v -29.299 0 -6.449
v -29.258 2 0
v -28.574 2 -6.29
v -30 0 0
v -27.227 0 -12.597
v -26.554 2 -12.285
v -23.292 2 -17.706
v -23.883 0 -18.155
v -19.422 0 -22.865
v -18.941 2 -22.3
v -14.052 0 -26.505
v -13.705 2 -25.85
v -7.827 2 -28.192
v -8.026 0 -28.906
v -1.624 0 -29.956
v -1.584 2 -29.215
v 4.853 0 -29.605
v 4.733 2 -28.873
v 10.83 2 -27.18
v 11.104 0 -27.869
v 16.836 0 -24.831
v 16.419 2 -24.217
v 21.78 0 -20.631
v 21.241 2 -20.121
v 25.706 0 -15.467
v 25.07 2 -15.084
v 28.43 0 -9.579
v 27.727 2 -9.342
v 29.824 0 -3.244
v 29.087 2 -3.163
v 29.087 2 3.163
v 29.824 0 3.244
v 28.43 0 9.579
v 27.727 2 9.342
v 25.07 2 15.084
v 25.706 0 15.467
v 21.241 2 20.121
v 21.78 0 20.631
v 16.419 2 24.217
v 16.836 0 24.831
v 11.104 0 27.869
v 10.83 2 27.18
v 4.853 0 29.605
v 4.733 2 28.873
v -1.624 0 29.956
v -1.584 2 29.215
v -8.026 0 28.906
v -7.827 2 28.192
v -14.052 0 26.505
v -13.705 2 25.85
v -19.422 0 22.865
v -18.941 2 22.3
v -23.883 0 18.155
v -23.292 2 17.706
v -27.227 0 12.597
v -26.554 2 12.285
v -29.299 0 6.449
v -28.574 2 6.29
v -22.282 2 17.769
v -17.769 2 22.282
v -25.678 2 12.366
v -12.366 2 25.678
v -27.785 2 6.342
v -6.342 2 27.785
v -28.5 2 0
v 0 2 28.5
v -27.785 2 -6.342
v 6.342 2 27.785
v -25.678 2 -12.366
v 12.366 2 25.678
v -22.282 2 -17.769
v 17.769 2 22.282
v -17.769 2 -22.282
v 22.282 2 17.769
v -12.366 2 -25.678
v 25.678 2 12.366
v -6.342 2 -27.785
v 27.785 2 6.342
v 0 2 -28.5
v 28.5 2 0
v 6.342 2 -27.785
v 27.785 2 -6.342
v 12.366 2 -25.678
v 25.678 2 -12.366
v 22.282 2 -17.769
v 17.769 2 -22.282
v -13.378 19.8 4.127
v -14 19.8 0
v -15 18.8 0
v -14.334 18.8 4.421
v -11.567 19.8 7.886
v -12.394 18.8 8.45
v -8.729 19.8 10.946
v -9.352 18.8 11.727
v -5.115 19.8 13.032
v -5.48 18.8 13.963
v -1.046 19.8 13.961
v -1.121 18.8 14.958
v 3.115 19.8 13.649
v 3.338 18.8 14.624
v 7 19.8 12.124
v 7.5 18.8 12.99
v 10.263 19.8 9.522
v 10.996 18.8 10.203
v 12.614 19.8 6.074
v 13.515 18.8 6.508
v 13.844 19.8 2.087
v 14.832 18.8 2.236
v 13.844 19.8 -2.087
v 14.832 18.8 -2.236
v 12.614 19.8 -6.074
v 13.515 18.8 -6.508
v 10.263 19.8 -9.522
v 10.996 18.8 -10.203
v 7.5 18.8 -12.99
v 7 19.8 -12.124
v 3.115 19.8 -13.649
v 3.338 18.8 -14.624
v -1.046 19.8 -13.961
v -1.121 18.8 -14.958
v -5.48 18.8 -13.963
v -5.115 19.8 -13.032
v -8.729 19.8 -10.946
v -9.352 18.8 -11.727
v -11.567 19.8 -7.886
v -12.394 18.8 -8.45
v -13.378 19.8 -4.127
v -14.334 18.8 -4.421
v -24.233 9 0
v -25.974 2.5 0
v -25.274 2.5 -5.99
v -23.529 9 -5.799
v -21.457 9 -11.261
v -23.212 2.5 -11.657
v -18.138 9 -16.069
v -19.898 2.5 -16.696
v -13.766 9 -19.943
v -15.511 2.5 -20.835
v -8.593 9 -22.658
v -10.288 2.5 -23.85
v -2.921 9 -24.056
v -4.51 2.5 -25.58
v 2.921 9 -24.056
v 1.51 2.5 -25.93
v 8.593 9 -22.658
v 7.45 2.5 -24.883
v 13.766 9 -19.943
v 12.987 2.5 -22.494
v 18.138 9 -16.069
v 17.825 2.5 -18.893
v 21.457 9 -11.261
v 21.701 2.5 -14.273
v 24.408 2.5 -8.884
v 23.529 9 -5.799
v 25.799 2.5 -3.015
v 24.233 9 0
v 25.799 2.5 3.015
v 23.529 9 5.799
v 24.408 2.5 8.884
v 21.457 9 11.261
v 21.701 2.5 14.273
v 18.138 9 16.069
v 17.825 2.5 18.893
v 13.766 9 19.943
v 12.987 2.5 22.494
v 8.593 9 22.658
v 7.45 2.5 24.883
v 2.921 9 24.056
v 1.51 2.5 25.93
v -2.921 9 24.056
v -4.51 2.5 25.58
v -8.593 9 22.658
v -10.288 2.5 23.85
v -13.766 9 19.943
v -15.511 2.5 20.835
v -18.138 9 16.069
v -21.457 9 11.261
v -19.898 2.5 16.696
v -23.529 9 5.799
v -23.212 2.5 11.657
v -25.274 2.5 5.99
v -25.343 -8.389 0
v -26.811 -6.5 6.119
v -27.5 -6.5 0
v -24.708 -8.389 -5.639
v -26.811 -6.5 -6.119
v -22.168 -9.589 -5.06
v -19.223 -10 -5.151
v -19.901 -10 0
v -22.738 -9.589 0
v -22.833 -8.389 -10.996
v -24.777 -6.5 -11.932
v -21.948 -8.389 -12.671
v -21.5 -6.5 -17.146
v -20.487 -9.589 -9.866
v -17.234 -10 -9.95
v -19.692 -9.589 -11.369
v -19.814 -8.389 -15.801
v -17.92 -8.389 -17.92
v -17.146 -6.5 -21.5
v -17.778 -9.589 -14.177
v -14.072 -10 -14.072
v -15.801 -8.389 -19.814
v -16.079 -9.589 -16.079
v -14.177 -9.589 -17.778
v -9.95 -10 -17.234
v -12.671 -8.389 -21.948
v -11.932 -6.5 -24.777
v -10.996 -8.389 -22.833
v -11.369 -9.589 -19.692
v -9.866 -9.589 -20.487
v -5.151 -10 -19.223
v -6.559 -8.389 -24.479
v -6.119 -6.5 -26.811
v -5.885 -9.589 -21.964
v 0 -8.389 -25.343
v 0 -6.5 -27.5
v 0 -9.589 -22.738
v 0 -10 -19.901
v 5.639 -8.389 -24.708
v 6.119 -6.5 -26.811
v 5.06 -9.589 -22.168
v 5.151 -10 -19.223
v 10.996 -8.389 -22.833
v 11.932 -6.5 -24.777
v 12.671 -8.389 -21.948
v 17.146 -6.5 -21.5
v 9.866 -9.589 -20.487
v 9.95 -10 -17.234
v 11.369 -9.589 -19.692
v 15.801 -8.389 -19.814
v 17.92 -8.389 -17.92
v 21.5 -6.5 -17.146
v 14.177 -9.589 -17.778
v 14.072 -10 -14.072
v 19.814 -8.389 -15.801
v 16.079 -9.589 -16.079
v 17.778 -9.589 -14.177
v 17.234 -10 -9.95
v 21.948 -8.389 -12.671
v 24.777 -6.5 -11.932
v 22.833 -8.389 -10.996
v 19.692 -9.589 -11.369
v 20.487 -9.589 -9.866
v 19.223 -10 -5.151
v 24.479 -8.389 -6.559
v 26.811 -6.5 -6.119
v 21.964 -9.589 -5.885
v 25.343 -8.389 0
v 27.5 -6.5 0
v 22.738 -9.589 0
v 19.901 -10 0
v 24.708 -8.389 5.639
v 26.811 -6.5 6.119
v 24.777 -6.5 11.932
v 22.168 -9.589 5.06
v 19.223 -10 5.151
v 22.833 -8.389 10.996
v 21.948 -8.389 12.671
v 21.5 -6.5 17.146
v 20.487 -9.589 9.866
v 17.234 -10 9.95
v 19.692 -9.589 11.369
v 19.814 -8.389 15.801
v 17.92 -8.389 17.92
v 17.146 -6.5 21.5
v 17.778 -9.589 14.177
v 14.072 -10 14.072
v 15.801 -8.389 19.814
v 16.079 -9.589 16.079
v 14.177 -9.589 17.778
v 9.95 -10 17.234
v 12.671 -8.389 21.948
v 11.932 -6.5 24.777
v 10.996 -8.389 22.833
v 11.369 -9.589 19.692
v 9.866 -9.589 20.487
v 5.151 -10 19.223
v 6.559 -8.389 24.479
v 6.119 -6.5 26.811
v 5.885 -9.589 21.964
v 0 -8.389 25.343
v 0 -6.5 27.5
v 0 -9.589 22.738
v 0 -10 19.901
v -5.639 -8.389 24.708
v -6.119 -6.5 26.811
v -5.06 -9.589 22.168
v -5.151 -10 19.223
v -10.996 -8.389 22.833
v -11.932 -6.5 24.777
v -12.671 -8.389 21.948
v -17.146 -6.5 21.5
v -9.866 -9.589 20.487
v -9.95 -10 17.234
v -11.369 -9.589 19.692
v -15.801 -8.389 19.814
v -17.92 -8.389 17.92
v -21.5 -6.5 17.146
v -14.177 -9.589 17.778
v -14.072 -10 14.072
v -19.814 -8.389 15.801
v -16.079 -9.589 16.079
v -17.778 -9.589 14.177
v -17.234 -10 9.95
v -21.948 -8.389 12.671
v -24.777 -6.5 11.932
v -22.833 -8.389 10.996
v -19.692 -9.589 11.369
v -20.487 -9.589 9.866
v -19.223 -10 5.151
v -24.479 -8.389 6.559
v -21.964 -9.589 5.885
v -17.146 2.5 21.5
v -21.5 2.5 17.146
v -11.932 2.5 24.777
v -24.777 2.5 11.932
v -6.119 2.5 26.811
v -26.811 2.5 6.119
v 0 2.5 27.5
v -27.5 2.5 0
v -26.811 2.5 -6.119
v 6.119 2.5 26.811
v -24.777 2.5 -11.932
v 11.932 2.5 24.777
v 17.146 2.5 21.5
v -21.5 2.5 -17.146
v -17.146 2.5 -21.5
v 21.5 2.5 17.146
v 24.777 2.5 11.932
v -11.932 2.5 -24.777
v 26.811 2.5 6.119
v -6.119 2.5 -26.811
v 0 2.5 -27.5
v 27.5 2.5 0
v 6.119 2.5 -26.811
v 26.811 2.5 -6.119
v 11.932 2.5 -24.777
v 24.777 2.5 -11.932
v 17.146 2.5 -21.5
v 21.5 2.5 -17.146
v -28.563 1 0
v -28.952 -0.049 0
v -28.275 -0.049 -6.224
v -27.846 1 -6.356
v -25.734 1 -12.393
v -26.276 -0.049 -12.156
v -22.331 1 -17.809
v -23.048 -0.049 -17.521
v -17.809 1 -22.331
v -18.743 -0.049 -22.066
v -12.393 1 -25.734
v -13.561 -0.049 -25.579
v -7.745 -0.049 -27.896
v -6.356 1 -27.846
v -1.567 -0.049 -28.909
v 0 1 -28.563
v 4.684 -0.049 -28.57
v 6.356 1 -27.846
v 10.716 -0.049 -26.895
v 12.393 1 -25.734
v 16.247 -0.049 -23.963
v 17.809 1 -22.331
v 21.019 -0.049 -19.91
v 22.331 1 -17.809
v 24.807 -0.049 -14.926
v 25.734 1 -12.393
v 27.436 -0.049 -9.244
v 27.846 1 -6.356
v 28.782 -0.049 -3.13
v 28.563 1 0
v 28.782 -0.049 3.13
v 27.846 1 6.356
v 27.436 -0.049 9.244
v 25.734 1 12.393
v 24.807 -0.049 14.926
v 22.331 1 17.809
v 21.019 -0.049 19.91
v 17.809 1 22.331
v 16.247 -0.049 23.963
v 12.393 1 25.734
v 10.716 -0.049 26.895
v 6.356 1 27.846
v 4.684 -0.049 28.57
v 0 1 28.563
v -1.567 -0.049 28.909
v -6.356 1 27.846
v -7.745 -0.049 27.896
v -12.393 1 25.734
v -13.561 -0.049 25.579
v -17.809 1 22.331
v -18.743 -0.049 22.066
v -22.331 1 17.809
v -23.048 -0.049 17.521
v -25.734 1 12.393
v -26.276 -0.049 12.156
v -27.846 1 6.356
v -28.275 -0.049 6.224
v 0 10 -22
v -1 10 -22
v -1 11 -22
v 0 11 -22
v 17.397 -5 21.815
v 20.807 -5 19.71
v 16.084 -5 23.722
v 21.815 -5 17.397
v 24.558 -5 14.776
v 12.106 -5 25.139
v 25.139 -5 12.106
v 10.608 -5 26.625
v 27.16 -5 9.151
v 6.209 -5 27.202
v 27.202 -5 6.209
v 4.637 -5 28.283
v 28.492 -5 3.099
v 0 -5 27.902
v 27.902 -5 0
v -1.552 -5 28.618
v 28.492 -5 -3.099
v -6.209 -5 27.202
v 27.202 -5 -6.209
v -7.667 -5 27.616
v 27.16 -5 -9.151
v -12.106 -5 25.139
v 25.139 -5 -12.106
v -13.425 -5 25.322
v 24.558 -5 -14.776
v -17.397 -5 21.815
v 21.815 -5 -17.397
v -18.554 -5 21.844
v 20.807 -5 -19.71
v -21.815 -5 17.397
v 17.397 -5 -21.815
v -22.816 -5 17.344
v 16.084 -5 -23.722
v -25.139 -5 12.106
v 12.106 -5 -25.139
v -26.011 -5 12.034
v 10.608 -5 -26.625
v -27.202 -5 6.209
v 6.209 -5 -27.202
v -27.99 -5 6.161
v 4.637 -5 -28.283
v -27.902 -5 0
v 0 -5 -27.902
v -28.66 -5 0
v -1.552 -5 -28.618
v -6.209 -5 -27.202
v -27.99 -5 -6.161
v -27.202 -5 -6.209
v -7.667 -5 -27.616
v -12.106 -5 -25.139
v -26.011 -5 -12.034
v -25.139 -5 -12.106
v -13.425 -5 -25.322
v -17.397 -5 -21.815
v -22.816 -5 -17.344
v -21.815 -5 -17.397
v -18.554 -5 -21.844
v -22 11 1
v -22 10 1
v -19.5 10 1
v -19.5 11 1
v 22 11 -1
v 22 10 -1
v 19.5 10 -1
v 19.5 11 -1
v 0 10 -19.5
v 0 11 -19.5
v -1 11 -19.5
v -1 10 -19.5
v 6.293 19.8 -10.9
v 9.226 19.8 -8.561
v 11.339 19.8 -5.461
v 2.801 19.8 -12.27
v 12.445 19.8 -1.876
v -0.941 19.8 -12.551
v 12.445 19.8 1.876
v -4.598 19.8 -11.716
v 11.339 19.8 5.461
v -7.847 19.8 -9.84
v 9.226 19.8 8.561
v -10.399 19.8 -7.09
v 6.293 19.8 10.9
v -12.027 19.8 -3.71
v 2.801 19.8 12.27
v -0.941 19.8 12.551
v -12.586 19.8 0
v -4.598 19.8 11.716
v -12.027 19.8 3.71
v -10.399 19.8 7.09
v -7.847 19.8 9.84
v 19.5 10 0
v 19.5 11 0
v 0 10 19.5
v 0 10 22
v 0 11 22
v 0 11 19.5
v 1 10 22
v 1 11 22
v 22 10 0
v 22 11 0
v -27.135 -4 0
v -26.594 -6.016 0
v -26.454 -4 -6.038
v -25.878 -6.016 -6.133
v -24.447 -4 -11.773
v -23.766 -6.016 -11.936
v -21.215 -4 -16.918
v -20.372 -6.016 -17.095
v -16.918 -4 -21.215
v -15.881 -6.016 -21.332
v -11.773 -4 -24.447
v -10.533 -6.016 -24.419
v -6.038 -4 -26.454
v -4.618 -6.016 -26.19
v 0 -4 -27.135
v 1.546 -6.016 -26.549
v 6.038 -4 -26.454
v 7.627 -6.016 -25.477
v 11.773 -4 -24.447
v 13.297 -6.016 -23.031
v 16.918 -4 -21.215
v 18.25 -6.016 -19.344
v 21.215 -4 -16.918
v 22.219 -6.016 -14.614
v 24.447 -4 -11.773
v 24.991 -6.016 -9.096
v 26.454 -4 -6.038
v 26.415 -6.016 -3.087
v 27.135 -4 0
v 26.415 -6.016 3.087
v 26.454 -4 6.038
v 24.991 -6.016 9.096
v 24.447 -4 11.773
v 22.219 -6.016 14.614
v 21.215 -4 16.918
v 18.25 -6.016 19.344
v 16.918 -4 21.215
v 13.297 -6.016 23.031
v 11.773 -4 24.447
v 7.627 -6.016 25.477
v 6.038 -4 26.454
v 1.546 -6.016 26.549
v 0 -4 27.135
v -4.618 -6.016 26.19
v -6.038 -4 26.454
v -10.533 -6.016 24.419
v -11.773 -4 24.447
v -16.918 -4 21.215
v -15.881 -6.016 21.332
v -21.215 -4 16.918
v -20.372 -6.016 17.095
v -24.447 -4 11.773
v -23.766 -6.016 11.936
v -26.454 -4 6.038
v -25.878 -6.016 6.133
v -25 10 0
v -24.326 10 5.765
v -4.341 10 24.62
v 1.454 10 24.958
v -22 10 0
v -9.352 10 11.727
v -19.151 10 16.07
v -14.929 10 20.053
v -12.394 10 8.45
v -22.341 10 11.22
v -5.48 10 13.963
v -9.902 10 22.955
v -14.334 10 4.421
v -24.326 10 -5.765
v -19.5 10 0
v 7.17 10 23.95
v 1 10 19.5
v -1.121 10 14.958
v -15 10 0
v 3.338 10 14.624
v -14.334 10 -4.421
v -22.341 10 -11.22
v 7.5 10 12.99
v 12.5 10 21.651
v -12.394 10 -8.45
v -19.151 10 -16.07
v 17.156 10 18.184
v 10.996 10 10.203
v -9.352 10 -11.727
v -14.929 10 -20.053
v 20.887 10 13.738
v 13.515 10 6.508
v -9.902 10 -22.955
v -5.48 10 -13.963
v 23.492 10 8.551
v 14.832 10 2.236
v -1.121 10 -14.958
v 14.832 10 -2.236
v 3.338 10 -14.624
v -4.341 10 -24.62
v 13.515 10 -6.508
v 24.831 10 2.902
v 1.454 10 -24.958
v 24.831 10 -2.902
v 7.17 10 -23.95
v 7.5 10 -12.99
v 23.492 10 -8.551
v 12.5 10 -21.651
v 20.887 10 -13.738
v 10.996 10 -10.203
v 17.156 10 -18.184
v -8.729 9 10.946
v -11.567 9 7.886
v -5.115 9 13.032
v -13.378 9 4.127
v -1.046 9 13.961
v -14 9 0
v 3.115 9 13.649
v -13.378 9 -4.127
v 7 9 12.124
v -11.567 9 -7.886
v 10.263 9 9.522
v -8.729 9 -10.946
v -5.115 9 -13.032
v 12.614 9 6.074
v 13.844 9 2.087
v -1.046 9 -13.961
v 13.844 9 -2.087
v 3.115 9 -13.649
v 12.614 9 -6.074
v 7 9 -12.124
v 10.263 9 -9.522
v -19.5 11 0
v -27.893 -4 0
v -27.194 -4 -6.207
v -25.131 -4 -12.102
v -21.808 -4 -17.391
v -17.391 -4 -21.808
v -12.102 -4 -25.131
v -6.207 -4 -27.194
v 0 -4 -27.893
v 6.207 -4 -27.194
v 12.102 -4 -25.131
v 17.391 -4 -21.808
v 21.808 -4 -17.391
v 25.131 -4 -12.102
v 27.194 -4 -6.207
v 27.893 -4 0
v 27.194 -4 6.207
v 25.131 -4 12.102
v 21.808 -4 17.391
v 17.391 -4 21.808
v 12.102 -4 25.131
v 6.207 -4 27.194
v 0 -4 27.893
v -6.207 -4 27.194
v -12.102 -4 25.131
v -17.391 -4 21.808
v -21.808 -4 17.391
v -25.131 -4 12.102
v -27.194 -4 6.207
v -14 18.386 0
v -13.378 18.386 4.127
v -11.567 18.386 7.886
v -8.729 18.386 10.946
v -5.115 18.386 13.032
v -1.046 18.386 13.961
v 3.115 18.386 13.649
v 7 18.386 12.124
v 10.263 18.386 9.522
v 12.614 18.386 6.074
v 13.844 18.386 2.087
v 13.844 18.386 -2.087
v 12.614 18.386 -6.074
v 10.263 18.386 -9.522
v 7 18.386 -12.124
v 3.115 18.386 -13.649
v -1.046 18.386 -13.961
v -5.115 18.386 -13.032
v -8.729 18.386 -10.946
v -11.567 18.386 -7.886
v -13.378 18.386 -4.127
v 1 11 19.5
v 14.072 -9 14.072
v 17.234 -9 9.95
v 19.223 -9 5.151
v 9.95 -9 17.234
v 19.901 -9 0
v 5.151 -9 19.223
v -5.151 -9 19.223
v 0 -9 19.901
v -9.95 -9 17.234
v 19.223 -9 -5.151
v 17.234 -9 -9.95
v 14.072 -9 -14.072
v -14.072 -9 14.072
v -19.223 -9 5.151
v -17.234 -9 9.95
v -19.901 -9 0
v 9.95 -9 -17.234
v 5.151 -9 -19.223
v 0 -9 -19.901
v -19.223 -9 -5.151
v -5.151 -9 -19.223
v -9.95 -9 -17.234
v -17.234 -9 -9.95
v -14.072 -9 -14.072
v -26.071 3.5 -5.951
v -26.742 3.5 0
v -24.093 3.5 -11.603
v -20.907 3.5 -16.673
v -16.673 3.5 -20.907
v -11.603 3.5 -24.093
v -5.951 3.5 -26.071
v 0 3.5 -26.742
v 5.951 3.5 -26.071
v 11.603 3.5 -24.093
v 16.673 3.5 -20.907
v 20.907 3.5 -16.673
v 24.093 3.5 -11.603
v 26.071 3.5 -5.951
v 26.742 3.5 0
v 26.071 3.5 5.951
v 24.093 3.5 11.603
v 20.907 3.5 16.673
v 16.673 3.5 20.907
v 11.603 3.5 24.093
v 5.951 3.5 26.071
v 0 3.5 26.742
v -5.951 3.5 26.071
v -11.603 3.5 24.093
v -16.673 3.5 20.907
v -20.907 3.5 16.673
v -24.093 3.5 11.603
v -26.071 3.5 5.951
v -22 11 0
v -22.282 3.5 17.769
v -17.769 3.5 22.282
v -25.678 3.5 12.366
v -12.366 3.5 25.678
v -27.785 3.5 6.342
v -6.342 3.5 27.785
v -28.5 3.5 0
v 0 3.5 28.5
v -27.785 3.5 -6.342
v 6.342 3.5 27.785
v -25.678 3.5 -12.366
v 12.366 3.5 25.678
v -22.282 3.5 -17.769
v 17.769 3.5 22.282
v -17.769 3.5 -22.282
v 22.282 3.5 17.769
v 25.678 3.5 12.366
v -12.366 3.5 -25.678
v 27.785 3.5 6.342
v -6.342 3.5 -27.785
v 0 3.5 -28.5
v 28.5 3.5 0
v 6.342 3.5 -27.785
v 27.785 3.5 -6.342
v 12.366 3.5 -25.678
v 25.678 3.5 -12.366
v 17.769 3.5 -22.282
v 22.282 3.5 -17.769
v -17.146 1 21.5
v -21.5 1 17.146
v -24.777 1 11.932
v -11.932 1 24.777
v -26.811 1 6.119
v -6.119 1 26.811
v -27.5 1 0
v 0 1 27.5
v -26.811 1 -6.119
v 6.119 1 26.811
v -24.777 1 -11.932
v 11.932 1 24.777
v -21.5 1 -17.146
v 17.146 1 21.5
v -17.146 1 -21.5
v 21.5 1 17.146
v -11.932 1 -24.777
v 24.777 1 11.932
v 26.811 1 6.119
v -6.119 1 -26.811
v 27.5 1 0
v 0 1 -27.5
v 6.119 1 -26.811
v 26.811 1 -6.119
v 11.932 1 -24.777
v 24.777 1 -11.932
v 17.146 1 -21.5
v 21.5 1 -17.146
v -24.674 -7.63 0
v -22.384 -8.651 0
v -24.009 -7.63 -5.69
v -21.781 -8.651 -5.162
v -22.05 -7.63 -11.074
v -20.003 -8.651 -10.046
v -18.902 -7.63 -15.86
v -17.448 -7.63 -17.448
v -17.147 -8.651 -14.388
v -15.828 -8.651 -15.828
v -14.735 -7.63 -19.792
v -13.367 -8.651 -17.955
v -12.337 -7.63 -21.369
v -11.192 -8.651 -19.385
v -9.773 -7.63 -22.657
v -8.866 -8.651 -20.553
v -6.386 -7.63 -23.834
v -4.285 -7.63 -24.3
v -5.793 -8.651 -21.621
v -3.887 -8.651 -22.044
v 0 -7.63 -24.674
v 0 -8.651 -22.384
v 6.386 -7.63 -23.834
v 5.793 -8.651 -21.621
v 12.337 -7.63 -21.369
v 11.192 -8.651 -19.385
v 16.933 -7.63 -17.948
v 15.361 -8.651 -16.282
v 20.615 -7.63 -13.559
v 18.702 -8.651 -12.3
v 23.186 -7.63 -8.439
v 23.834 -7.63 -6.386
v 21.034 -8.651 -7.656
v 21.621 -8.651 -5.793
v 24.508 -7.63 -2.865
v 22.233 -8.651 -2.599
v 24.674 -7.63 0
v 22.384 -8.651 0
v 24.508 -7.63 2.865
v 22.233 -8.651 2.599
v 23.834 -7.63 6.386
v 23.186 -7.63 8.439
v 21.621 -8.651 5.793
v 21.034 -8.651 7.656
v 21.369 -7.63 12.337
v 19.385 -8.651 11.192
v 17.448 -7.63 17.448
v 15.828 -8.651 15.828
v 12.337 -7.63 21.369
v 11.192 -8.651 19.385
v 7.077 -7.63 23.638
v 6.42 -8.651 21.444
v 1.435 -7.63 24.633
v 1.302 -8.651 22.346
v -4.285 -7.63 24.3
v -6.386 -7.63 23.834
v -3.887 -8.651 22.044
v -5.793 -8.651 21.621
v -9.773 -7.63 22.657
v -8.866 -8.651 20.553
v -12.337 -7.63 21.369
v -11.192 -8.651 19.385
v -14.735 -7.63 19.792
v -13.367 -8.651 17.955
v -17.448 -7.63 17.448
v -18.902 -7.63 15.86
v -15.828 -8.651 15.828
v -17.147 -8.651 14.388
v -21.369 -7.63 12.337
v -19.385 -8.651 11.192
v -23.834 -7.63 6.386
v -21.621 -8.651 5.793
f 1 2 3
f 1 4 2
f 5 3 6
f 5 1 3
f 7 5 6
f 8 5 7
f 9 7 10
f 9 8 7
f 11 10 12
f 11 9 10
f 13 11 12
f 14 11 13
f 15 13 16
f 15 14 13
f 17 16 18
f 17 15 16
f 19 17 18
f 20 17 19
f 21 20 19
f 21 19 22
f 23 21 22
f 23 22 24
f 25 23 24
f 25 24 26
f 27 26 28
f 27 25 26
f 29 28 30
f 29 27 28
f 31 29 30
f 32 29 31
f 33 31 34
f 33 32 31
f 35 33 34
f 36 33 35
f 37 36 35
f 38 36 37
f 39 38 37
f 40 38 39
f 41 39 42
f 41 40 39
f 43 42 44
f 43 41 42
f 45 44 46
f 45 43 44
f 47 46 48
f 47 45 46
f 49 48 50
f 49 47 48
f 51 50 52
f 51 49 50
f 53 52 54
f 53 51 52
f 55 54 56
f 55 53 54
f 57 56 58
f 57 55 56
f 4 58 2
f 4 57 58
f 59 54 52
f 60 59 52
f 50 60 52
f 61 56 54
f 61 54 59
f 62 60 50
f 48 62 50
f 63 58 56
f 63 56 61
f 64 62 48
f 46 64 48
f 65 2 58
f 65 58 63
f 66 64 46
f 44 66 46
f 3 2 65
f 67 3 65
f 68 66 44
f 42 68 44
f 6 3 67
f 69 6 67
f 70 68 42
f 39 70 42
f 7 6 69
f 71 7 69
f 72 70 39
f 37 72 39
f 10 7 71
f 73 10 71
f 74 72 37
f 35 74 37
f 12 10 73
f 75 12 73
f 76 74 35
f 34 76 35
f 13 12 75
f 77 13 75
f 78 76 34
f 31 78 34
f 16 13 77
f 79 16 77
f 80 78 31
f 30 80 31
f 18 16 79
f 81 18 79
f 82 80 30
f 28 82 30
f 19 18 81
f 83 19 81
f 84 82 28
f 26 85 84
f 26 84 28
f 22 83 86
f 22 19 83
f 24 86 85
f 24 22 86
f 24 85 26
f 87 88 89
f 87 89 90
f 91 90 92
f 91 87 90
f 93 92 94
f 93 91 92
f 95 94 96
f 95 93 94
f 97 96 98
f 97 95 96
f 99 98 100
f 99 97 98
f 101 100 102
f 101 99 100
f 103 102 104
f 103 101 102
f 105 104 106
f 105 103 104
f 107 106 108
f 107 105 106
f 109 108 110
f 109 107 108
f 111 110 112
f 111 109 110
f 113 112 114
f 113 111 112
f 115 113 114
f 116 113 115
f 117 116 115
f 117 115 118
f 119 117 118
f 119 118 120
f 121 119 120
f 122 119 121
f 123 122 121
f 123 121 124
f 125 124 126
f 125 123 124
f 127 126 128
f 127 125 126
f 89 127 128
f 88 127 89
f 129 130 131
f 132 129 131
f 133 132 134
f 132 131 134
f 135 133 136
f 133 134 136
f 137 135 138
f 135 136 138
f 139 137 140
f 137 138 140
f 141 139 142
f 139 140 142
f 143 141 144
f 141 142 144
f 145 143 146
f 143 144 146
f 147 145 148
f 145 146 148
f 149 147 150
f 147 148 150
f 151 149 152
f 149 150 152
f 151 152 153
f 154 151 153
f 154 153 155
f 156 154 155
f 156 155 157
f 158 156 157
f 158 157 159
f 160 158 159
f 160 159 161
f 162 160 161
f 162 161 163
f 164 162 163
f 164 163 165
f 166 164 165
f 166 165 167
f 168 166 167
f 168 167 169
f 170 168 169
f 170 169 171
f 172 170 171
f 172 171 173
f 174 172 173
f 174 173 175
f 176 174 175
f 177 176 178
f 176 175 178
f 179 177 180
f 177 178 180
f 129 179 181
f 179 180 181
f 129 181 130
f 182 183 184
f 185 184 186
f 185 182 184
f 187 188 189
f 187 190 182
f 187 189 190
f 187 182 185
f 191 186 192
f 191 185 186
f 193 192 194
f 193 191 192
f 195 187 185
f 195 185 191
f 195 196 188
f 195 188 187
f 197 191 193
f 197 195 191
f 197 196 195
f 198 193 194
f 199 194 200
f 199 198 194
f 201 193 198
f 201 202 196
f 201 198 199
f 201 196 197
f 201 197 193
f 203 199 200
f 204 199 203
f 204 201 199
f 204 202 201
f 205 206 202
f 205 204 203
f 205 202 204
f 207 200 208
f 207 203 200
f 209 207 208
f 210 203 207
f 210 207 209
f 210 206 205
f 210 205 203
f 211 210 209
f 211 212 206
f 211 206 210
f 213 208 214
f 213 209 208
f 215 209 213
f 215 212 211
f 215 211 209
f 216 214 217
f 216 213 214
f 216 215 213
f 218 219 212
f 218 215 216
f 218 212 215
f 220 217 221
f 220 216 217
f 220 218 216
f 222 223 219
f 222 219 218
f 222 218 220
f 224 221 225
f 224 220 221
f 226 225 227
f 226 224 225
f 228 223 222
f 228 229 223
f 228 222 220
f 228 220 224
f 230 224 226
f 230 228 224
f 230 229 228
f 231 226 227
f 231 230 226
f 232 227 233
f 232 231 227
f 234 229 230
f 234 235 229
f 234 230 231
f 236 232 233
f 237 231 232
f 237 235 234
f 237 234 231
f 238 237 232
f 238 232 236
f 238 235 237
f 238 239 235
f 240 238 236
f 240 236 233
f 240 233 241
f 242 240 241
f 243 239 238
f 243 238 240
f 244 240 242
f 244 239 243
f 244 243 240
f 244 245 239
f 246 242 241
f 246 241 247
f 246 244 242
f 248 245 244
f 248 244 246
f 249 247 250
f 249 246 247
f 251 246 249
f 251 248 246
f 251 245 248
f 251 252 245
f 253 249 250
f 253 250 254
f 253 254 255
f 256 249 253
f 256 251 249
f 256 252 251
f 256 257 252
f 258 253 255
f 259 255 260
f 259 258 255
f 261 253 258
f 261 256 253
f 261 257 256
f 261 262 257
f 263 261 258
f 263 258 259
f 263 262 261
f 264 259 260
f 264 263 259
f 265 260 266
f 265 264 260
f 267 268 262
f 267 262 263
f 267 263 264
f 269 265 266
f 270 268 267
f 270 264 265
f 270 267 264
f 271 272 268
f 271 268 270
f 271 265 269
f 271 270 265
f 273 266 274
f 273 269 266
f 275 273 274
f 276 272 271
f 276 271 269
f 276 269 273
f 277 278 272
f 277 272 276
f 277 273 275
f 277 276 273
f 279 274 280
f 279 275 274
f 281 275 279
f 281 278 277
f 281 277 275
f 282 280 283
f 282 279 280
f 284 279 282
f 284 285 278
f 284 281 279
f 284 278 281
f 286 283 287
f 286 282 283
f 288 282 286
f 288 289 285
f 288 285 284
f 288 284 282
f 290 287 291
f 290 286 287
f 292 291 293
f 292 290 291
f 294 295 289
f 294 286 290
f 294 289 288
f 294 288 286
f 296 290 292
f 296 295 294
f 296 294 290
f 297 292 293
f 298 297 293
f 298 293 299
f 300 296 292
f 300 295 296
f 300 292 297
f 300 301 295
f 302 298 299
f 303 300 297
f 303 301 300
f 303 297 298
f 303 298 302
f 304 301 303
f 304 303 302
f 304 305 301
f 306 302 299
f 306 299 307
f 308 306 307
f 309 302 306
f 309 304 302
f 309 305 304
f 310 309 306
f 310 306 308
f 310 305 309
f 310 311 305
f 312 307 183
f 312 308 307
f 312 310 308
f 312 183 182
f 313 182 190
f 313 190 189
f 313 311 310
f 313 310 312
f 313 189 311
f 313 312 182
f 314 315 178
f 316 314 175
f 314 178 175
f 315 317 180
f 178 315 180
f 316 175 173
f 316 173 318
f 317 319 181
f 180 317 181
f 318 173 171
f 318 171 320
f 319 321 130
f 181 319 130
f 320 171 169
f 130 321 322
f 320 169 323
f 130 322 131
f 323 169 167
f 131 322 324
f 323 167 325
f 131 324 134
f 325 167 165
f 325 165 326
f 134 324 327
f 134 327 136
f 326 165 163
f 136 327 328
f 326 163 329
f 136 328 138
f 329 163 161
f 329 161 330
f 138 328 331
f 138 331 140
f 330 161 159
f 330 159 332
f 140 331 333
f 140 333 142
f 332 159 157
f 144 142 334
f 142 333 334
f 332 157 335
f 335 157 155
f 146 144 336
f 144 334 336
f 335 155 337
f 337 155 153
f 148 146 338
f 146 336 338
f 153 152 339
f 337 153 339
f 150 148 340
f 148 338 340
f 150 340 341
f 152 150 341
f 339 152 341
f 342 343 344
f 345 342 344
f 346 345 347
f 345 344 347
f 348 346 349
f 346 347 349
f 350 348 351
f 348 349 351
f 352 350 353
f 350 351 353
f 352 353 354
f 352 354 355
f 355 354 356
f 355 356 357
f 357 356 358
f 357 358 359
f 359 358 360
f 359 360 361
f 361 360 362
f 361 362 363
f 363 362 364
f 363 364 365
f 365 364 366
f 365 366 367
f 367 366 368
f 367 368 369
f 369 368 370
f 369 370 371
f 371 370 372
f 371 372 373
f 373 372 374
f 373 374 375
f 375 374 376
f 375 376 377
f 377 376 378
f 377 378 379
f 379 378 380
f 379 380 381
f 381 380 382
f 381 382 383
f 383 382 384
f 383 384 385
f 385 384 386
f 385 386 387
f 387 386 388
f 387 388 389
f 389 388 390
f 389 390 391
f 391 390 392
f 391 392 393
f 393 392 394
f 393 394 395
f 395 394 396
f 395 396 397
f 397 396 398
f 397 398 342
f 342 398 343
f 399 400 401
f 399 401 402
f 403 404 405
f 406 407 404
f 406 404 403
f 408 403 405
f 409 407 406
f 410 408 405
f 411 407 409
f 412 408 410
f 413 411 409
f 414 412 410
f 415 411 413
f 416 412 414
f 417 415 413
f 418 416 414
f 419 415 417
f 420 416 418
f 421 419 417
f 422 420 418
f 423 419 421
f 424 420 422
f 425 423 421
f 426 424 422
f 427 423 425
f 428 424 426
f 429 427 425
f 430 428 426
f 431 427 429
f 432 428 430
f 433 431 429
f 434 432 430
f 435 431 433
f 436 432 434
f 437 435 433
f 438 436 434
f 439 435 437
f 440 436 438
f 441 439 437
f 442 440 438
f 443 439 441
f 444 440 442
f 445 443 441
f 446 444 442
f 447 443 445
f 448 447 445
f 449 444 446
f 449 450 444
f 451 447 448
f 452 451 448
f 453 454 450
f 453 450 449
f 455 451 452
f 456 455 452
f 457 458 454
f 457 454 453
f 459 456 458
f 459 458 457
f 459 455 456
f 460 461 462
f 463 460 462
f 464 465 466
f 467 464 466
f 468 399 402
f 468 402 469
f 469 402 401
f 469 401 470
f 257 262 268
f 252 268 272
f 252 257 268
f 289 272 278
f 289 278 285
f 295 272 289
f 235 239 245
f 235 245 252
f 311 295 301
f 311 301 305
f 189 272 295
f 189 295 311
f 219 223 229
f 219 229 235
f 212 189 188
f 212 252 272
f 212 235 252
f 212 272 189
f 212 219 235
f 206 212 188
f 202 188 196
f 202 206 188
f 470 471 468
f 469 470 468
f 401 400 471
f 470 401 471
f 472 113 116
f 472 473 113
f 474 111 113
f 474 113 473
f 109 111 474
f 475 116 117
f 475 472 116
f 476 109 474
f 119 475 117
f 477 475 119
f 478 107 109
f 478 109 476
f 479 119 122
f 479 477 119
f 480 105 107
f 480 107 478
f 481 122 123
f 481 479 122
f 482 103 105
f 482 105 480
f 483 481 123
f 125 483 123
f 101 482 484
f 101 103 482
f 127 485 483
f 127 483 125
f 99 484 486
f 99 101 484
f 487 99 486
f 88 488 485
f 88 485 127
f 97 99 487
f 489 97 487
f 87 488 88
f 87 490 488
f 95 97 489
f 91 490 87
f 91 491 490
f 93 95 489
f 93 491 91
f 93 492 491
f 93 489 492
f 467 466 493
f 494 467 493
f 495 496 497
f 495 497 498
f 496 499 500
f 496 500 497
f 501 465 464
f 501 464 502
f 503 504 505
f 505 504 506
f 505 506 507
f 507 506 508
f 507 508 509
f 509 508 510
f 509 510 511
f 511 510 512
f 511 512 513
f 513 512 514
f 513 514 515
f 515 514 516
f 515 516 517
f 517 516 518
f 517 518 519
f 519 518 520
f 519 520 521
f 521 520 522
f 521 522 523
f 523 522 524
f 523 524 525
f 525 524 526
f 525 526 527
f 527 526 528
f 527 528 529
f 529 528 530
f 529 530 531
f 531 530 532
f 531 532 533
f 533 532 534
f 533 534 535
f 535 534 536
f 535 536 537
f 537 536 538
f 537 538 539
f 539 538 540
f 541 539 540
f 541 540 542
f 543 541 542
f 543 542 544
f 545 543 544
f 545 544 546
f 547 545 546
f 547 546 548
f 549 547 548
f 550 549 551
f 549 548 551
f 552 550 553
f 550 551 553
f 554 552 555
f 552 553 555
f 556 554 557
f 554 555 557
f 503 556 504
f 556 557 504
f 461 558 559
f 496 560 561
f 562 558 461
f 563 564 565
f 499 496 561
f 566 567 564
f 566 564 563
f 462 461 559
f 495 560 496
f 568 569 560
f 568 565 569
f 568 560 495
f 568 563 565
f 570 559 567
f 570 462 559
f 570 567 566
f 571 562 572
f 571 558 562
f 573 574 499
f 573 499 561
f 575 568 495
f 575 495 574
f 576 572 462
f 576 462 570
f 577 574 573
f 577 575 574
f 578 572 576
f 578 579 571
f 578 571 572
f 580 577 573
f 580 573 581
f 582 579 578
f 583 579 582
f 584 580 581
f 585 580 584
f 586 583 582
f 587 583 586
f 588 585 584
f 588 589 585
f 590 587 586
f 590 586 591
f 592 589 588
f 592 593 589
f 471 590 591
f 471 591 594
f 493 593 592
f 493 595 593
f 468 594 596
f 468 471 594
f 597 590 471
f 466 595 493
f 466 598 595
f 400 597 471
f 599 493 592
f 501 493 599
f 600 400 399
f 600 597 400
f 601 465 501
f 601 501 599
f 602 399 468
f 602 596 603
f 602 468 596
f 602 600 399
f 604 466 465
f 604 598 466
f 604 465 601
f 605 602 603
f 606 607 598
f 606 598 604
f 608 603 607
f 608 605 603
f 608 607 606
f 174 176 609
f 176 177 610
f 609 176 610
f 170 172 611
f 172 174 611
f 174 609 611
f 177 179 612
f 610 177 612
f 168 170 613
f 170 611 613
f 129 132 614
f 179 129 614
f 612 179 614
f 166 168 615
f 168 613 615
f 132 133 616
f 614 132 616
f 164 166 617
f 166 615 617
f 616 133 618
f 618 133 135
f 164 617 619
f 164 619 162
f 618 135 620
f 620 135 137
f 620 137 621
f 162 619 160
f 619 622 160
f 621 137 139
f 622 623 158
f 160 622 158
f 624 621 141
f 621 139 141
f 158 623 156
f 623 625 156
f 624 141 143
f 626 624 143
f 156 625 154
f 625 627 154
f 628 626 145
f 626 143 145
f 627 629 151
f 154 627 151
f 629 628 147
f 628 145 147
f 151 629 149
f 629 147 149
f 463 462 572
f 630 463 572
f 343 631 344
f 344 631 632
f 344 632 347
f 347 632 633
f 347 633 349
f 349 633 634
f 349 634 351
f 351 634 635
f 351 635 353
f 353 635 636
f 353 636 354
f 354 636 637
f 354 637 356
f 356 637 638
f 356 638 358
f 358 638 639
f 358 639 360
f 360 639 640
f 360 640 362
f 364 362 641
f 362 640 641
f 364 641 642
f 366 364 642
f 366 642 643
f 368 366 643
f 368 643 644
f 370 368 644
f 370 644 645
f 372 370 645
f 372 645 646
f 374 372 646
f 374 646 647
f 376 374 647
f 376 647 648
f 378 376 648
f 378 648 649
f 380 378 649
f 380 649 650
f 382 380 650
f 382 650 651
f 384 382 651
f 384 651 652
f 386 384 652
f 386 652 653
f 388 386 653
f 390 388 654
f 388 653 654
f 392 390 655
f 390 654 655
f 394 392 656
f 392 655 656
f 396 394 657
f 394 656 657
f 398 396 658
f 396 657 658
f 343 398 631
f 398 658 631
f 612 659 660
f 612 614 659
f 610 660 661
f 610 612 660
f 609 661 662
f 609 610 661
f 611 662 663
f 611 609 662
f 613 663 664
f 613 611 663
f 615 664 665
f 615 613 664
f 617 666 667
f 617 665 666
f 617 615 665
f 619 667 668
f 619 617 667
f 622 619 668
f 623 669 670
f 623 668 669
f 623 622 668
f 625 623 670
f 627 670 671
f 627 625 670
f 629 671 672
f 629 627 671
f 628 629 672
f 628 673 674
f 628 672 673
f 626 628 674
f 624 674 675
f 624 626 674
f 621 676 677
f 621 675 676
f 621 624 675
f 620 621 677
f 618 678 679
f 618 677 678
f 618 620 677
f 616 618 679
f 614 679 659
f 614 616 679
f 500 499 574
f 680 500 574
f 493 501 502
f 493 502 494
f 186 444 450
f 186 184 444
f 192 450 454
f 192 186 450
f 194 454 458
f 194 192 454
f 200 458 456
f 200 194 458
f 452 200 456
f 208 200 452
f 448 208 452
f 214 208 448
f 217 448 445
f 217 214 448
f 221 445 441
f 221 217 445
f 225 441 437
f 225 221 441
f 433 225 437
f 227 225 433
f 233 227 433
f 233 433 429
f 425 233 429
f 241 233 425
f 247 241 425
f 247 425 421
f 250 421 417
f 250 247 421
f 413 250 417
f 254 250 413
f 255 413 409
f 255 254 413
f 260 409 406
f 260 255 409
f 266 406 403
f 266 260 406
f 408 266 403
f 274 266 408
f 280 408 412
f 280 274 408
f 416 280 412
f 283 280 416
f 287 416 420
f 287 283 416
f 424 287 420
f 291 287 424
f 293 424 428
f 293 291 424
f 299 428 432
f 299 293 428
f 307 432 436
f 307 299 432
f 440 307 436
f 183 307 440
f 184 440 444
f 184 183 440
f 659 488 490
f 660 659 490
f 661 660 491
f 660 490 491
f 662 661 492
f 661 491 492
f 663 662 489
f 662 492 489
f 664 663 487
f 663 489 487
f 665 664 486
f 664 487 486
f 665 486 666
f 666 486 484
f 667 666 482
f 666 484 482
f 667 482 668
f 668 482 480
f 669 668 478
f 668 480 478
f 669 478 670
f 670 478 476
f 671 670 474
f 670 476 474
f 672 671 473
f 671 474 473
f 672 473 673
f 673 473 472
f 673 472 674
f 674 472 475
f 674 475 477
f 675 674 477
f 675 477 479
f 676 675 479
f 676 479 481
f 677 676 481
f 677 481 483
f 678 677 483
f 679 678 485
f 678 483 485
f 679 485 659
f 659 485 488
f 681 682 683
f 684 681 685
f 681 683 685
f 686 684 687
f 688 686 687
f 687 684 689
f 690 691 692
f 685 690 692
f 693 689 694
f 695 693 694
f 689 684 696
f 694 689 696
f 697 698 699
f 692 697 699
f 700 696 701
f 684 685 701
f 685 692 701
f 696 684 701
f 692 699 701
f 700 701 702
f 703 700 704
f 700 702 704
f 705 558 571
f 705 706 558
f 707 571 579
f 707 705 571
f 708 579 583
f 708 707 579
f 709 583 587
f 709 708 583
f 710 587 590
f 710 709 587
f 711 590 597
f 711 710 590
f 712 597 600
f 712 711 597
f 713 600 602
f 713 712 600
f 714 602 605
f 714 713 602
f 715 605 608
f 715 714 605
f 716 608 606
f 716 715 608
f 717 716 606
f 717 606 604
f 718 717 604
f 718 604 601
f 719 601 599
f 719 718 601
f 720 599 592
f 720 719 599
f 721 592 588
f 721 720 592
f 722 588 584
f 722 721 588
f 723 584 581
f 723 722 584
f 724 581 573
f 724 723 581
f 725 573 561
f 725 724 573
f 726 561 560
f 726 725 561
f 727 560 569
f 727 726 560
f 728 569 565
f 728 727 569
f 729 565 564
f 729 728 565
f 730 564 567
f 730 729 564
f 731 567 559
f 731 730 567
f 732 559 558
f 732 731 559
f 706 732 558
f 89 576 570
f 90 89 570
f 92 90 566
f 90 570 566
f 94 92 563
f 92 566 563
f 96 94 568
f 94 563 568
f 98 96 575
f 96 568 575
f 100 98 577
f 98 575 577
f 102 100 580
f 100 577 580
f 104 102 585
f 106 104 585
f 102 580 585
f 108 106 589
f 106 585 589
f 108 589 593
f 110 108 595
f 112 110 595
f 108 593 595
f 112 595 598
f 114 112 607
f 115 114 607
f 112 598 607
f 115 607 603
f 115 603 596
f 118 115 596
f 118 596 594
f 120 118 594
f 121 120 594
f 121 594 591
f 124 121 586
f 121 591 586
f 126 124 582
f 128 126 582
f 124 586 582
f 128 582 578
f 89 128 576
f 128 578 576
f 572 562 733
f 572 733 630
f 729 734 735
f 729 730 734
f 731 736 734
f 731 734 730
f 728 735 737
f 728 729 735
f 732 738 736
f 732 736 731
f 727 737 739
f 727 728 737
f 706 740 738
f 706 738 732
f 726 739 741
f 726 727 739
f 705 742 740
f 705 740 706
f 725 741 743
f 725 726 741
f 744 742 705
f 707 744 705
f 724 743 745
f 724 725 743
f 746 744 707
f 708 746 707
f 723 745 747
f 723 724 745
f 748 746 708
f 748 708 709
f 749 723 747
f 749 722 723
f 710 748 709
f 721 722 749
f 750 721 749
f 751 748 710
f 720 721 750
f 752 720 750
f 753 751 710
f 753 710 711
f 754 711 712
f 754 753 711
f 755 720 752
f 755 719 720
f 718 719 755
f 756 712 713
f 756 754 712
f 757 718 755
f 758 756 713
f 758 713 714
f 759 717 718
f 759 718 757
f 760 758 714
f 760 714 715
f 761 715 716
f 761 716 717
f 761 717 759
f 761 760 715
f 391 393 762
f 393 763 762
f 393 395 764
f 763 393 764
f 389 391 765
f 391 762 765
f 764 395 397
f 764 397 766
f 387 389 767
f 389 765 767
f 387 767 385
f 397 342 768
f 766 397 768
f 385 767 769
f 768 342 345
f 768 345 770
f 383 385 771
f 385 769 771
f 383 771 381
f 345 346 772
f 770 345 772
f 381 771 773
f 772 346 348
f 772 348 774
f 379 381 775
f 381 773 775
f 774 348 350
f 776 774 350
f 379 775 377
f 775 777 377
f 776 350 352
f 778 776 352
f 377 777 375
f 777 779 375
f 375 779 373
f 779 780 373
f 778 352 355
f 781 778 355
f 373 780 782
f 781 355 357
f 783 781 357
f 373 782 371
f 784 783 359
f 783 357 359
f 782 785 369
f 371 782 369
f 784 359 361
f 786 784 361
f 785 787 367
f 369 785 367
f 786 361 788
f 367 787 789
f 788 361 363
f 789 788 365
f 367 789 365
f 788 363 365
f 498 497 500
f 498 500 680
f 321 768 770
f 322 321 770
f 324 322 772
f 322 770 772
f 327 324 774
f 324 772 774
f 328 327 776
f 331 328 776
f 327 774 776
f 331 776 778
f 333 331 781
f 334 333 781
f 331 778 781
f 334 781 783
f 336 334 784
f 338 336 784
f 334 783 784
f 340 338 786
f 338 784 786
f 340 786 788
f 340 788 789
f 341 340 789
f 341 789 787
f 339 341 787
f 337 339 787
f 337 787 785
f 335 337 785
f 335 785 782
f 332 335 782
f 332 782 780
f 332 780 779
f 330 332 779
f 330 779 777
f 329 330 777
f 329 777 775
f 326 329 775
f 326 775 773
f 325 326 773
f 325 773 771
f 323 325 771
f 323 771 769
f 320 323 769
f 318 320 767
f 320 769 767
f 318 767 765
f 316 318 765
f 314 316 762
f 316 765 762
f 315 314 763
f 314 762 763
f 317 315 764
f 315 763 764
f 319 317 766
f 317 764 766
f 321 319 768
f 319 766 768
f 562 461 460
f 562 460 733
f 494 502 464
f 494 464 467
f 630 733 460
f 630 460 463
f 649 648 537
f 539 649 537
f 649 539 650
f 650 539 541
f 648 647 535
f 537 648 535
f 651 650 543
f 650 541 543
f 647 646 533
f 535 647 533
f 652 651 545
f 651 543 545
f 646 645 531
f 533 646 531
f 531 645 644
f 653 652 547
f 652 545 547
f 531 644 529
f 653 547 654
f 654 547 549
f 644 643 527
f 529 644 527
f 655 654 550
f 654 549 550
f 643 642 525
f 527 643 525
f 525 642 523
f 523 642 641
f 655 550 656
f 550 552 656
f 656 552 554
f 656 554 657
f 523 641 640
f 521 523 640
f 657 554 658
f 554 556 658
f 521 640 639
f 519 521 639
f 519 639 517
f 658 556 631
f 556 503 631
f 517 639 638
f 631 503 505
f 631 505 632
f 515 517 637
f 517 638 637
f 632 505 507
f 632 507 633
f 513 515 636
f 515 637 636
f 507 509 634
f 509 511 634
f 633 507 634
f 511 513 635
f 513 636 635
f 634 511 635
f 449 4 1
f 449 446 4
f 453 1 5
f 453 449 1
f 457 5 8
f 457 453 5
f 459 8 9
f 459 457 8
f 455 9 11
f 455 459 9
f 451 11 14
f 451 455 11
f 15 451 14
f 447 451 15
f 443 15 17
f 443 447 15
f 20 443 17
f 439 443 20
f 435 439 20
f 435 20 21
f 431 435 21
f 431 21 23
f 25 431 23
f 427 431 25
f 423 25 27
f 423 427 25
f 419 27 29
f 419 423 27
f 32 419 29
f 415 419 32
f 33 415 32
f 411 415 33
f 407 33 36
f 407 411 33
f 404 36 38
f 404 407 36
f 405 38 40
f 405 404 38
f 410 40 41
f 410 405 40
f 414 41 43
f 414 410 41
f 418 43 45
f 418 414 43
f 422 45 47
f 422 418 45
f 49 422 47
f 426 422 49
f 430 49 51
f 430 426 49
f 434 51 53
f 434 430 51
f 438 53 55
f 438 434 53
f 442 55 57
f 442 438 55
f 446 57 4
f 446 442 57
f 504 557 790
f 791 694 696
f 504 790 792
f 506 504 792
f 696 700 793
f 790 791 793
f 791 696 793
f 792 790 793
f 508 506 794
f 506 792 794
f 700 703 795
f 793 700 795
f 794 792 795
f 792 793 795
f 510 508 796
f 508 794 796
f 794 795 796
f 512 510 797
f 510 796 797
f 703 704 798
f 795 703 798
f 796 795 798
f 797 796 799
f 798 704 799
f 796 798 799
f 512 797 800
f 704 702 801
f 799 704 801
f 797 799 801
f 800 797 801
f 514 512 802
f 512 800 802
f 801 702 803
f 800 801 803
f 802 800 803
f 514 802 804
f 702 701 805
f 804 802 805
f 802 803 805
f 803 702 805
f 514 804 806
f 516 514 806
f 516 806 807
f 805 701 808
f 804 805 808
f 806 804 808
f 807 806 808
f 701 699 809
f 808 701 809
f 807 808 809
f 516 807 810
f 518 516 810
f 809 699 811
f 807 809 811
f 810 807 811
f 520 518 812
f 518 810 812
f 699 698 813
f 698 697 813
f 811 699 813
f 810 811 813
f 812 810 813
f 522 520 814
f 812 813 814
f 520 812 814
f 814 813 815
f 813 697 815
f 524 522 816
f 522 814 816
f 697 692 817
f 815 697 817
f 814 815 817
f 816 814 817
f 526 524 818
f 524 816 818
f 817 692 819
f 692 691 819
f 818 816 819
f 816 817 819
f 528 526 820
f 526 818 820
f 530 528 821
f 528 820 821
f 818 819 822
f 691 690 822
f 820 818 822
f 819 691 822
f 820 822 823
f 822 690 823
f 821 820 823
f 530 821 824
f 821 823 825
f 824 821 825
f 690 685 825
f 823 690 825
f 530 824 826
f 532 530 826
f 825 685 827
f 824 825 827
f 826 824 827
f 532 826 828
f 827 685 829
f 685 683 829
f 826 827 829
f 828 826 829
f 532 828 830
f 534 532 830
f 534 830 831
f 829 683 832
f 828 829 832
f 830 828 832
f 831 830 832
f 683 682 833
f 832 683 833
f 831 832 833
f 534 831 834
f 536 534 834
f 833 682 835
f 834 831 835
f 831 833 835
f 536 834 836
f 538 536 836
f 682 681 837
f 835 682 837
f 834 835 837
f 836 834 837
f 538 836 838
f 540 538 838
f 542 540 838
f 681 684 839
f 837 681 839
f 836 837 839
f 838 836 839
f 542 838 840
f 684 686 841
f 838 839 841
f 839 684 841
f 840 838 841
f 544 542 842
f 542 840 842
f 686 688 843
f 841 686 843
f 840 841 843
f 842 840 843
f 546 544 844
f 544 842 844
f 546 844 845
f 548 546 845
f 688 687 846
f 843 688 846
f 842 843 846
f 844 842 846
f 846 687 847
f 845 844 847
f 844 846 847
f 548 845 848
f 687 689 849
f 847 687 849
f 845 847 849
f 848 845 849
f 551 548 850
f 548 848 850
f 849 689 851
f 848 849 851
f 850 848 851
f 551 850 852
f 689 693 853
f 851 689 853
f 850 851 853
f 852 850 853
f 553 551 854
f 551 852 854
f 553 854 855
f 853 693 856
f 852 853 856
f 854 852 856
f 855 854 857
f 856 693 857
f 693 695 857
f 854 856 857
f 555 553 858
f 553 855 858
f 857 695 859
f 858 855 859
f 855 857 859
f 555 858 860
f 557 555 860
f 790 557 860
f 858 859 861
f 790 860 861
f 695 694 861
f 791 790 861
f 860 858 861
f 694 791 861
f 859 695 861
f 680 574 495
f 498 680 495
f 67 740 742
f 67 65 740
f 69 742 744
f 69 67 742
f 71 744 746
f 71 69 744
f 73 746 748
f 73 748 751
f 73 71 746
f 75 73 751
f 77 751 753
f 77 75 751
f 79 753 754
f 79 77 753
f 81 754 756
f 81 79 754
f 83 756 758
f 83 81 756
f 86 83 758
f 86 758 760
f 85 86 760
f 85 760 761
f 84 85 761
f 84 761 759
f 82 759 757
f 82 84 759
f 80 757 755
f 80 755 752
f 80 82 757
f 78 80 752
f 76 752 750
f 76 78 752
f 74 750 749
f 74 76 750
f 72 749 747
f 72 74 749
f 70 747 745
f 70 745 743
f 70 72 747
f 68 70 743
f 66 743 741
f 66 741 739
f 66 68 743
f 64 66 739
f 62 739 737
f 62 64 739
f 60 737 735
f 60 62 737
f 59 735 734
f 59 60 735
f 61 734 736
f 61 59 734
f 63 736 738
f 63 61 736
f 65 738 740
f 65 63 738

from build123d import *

# Parameters (mm, degrees)
SKETCH2_R           = 15
BOSS_EXTRUDE1_DEPTH = 9.8
CHAMFER1_SIZE       = 1
SHELL1_T            = -1
SKETCH7_W           = 2.5
SKETCH7_H           = 1
BOSS_EXTRUDE5_DEPTH = 1
CIRPATTERN1_COUNT   = 4


with BuildPart() as part:
    # Sketch1 → Revolve2 (revolve)
    with BuildSketch(Plane.XY):
        with BuildLine():
            Line((-25, 10), (-26.741669751, 3.5))
            Line((-26.741669751, 3.5), (-28.5, 3.5))
            Line((-28.5, 3.5), (-28.5, 2))
            Line((-28.5, 2), (-29.258330249, 2))
            Line((-29.258330249, 2), (-30, 0))
            Line((-30, 0), (-28.660254038, -5))
            Line((-28.660254038, -5), (-27.901923789, -5))
            Line((-27.901923789, -5), (-27.5, -6.5))
            ThreePointArc((-27.5, -6.5), (-24.083958056, -9.082951062), (-19.900657923, -10))
            Line((-19.900657923, -10), (0, -10))
            Line((0, -10), (0, 10))
            Line((0, 10), (-25, 10))
        make_face()
    revolve(axis=Axis((0, 614.019679743, 0), (0, -1, 0)))

    # Sketch2 → Boss-Extrude1 (add)
    with BuildSketch(Plane(origin=(0, 10, 0), x_dir=(1, 0, 0), z_dir=(0, 1, 0))):
        with Locations(Location((0, 0, 0), (0, 0, 180))):
            Circle(SKETCH2_R)
    extrude(amount=BOSS_EXTRUDE1_DEPTH)

    # Chamfer1
    chamfer1_edges = [part.edges().sort_by_distance(p)[0] for p in [
        (15, 19.8, 0),
    ]]
    chamfer(chamfer1_edges, length=CHAMFER1_SIZE)

    # Shell1
    shell1_openings = [part.faces().sort_by_distance(p)[0] for p in [
        (0, 19.8, 0),
    ]]
    offset(amount=SHELL1_T, openings=shell1_openings, kind=Kind.INTERSECTION)

    # Sketch7 → Boss-Extrude5 (add)
    with BuildSketch(Plane(origin=(0, 10, 0), x_dir=(1, 0, 0), z_dir=(0, 1, 0))):
        with Locations((-20.75, -0.5)):
            Rectangle(SKETCH7_W, SKETCH7_H)
    boss_extrude5 = extrude(amount=BOSS_EXTRUDE5_DEPTH)

    # CirPattern1: Boss-Extrude5 ×4 about axis
    cirpattern1_axis = Axis((0, 0, 0), (0, 1, 0))
    for i in range(1, CIRPATTERN1_COUNT):
        add(boss_extrude5.rotate(cirpattern1_axis, i * 360 / CIRPATTERN1_COUNT))


solid = part.part
